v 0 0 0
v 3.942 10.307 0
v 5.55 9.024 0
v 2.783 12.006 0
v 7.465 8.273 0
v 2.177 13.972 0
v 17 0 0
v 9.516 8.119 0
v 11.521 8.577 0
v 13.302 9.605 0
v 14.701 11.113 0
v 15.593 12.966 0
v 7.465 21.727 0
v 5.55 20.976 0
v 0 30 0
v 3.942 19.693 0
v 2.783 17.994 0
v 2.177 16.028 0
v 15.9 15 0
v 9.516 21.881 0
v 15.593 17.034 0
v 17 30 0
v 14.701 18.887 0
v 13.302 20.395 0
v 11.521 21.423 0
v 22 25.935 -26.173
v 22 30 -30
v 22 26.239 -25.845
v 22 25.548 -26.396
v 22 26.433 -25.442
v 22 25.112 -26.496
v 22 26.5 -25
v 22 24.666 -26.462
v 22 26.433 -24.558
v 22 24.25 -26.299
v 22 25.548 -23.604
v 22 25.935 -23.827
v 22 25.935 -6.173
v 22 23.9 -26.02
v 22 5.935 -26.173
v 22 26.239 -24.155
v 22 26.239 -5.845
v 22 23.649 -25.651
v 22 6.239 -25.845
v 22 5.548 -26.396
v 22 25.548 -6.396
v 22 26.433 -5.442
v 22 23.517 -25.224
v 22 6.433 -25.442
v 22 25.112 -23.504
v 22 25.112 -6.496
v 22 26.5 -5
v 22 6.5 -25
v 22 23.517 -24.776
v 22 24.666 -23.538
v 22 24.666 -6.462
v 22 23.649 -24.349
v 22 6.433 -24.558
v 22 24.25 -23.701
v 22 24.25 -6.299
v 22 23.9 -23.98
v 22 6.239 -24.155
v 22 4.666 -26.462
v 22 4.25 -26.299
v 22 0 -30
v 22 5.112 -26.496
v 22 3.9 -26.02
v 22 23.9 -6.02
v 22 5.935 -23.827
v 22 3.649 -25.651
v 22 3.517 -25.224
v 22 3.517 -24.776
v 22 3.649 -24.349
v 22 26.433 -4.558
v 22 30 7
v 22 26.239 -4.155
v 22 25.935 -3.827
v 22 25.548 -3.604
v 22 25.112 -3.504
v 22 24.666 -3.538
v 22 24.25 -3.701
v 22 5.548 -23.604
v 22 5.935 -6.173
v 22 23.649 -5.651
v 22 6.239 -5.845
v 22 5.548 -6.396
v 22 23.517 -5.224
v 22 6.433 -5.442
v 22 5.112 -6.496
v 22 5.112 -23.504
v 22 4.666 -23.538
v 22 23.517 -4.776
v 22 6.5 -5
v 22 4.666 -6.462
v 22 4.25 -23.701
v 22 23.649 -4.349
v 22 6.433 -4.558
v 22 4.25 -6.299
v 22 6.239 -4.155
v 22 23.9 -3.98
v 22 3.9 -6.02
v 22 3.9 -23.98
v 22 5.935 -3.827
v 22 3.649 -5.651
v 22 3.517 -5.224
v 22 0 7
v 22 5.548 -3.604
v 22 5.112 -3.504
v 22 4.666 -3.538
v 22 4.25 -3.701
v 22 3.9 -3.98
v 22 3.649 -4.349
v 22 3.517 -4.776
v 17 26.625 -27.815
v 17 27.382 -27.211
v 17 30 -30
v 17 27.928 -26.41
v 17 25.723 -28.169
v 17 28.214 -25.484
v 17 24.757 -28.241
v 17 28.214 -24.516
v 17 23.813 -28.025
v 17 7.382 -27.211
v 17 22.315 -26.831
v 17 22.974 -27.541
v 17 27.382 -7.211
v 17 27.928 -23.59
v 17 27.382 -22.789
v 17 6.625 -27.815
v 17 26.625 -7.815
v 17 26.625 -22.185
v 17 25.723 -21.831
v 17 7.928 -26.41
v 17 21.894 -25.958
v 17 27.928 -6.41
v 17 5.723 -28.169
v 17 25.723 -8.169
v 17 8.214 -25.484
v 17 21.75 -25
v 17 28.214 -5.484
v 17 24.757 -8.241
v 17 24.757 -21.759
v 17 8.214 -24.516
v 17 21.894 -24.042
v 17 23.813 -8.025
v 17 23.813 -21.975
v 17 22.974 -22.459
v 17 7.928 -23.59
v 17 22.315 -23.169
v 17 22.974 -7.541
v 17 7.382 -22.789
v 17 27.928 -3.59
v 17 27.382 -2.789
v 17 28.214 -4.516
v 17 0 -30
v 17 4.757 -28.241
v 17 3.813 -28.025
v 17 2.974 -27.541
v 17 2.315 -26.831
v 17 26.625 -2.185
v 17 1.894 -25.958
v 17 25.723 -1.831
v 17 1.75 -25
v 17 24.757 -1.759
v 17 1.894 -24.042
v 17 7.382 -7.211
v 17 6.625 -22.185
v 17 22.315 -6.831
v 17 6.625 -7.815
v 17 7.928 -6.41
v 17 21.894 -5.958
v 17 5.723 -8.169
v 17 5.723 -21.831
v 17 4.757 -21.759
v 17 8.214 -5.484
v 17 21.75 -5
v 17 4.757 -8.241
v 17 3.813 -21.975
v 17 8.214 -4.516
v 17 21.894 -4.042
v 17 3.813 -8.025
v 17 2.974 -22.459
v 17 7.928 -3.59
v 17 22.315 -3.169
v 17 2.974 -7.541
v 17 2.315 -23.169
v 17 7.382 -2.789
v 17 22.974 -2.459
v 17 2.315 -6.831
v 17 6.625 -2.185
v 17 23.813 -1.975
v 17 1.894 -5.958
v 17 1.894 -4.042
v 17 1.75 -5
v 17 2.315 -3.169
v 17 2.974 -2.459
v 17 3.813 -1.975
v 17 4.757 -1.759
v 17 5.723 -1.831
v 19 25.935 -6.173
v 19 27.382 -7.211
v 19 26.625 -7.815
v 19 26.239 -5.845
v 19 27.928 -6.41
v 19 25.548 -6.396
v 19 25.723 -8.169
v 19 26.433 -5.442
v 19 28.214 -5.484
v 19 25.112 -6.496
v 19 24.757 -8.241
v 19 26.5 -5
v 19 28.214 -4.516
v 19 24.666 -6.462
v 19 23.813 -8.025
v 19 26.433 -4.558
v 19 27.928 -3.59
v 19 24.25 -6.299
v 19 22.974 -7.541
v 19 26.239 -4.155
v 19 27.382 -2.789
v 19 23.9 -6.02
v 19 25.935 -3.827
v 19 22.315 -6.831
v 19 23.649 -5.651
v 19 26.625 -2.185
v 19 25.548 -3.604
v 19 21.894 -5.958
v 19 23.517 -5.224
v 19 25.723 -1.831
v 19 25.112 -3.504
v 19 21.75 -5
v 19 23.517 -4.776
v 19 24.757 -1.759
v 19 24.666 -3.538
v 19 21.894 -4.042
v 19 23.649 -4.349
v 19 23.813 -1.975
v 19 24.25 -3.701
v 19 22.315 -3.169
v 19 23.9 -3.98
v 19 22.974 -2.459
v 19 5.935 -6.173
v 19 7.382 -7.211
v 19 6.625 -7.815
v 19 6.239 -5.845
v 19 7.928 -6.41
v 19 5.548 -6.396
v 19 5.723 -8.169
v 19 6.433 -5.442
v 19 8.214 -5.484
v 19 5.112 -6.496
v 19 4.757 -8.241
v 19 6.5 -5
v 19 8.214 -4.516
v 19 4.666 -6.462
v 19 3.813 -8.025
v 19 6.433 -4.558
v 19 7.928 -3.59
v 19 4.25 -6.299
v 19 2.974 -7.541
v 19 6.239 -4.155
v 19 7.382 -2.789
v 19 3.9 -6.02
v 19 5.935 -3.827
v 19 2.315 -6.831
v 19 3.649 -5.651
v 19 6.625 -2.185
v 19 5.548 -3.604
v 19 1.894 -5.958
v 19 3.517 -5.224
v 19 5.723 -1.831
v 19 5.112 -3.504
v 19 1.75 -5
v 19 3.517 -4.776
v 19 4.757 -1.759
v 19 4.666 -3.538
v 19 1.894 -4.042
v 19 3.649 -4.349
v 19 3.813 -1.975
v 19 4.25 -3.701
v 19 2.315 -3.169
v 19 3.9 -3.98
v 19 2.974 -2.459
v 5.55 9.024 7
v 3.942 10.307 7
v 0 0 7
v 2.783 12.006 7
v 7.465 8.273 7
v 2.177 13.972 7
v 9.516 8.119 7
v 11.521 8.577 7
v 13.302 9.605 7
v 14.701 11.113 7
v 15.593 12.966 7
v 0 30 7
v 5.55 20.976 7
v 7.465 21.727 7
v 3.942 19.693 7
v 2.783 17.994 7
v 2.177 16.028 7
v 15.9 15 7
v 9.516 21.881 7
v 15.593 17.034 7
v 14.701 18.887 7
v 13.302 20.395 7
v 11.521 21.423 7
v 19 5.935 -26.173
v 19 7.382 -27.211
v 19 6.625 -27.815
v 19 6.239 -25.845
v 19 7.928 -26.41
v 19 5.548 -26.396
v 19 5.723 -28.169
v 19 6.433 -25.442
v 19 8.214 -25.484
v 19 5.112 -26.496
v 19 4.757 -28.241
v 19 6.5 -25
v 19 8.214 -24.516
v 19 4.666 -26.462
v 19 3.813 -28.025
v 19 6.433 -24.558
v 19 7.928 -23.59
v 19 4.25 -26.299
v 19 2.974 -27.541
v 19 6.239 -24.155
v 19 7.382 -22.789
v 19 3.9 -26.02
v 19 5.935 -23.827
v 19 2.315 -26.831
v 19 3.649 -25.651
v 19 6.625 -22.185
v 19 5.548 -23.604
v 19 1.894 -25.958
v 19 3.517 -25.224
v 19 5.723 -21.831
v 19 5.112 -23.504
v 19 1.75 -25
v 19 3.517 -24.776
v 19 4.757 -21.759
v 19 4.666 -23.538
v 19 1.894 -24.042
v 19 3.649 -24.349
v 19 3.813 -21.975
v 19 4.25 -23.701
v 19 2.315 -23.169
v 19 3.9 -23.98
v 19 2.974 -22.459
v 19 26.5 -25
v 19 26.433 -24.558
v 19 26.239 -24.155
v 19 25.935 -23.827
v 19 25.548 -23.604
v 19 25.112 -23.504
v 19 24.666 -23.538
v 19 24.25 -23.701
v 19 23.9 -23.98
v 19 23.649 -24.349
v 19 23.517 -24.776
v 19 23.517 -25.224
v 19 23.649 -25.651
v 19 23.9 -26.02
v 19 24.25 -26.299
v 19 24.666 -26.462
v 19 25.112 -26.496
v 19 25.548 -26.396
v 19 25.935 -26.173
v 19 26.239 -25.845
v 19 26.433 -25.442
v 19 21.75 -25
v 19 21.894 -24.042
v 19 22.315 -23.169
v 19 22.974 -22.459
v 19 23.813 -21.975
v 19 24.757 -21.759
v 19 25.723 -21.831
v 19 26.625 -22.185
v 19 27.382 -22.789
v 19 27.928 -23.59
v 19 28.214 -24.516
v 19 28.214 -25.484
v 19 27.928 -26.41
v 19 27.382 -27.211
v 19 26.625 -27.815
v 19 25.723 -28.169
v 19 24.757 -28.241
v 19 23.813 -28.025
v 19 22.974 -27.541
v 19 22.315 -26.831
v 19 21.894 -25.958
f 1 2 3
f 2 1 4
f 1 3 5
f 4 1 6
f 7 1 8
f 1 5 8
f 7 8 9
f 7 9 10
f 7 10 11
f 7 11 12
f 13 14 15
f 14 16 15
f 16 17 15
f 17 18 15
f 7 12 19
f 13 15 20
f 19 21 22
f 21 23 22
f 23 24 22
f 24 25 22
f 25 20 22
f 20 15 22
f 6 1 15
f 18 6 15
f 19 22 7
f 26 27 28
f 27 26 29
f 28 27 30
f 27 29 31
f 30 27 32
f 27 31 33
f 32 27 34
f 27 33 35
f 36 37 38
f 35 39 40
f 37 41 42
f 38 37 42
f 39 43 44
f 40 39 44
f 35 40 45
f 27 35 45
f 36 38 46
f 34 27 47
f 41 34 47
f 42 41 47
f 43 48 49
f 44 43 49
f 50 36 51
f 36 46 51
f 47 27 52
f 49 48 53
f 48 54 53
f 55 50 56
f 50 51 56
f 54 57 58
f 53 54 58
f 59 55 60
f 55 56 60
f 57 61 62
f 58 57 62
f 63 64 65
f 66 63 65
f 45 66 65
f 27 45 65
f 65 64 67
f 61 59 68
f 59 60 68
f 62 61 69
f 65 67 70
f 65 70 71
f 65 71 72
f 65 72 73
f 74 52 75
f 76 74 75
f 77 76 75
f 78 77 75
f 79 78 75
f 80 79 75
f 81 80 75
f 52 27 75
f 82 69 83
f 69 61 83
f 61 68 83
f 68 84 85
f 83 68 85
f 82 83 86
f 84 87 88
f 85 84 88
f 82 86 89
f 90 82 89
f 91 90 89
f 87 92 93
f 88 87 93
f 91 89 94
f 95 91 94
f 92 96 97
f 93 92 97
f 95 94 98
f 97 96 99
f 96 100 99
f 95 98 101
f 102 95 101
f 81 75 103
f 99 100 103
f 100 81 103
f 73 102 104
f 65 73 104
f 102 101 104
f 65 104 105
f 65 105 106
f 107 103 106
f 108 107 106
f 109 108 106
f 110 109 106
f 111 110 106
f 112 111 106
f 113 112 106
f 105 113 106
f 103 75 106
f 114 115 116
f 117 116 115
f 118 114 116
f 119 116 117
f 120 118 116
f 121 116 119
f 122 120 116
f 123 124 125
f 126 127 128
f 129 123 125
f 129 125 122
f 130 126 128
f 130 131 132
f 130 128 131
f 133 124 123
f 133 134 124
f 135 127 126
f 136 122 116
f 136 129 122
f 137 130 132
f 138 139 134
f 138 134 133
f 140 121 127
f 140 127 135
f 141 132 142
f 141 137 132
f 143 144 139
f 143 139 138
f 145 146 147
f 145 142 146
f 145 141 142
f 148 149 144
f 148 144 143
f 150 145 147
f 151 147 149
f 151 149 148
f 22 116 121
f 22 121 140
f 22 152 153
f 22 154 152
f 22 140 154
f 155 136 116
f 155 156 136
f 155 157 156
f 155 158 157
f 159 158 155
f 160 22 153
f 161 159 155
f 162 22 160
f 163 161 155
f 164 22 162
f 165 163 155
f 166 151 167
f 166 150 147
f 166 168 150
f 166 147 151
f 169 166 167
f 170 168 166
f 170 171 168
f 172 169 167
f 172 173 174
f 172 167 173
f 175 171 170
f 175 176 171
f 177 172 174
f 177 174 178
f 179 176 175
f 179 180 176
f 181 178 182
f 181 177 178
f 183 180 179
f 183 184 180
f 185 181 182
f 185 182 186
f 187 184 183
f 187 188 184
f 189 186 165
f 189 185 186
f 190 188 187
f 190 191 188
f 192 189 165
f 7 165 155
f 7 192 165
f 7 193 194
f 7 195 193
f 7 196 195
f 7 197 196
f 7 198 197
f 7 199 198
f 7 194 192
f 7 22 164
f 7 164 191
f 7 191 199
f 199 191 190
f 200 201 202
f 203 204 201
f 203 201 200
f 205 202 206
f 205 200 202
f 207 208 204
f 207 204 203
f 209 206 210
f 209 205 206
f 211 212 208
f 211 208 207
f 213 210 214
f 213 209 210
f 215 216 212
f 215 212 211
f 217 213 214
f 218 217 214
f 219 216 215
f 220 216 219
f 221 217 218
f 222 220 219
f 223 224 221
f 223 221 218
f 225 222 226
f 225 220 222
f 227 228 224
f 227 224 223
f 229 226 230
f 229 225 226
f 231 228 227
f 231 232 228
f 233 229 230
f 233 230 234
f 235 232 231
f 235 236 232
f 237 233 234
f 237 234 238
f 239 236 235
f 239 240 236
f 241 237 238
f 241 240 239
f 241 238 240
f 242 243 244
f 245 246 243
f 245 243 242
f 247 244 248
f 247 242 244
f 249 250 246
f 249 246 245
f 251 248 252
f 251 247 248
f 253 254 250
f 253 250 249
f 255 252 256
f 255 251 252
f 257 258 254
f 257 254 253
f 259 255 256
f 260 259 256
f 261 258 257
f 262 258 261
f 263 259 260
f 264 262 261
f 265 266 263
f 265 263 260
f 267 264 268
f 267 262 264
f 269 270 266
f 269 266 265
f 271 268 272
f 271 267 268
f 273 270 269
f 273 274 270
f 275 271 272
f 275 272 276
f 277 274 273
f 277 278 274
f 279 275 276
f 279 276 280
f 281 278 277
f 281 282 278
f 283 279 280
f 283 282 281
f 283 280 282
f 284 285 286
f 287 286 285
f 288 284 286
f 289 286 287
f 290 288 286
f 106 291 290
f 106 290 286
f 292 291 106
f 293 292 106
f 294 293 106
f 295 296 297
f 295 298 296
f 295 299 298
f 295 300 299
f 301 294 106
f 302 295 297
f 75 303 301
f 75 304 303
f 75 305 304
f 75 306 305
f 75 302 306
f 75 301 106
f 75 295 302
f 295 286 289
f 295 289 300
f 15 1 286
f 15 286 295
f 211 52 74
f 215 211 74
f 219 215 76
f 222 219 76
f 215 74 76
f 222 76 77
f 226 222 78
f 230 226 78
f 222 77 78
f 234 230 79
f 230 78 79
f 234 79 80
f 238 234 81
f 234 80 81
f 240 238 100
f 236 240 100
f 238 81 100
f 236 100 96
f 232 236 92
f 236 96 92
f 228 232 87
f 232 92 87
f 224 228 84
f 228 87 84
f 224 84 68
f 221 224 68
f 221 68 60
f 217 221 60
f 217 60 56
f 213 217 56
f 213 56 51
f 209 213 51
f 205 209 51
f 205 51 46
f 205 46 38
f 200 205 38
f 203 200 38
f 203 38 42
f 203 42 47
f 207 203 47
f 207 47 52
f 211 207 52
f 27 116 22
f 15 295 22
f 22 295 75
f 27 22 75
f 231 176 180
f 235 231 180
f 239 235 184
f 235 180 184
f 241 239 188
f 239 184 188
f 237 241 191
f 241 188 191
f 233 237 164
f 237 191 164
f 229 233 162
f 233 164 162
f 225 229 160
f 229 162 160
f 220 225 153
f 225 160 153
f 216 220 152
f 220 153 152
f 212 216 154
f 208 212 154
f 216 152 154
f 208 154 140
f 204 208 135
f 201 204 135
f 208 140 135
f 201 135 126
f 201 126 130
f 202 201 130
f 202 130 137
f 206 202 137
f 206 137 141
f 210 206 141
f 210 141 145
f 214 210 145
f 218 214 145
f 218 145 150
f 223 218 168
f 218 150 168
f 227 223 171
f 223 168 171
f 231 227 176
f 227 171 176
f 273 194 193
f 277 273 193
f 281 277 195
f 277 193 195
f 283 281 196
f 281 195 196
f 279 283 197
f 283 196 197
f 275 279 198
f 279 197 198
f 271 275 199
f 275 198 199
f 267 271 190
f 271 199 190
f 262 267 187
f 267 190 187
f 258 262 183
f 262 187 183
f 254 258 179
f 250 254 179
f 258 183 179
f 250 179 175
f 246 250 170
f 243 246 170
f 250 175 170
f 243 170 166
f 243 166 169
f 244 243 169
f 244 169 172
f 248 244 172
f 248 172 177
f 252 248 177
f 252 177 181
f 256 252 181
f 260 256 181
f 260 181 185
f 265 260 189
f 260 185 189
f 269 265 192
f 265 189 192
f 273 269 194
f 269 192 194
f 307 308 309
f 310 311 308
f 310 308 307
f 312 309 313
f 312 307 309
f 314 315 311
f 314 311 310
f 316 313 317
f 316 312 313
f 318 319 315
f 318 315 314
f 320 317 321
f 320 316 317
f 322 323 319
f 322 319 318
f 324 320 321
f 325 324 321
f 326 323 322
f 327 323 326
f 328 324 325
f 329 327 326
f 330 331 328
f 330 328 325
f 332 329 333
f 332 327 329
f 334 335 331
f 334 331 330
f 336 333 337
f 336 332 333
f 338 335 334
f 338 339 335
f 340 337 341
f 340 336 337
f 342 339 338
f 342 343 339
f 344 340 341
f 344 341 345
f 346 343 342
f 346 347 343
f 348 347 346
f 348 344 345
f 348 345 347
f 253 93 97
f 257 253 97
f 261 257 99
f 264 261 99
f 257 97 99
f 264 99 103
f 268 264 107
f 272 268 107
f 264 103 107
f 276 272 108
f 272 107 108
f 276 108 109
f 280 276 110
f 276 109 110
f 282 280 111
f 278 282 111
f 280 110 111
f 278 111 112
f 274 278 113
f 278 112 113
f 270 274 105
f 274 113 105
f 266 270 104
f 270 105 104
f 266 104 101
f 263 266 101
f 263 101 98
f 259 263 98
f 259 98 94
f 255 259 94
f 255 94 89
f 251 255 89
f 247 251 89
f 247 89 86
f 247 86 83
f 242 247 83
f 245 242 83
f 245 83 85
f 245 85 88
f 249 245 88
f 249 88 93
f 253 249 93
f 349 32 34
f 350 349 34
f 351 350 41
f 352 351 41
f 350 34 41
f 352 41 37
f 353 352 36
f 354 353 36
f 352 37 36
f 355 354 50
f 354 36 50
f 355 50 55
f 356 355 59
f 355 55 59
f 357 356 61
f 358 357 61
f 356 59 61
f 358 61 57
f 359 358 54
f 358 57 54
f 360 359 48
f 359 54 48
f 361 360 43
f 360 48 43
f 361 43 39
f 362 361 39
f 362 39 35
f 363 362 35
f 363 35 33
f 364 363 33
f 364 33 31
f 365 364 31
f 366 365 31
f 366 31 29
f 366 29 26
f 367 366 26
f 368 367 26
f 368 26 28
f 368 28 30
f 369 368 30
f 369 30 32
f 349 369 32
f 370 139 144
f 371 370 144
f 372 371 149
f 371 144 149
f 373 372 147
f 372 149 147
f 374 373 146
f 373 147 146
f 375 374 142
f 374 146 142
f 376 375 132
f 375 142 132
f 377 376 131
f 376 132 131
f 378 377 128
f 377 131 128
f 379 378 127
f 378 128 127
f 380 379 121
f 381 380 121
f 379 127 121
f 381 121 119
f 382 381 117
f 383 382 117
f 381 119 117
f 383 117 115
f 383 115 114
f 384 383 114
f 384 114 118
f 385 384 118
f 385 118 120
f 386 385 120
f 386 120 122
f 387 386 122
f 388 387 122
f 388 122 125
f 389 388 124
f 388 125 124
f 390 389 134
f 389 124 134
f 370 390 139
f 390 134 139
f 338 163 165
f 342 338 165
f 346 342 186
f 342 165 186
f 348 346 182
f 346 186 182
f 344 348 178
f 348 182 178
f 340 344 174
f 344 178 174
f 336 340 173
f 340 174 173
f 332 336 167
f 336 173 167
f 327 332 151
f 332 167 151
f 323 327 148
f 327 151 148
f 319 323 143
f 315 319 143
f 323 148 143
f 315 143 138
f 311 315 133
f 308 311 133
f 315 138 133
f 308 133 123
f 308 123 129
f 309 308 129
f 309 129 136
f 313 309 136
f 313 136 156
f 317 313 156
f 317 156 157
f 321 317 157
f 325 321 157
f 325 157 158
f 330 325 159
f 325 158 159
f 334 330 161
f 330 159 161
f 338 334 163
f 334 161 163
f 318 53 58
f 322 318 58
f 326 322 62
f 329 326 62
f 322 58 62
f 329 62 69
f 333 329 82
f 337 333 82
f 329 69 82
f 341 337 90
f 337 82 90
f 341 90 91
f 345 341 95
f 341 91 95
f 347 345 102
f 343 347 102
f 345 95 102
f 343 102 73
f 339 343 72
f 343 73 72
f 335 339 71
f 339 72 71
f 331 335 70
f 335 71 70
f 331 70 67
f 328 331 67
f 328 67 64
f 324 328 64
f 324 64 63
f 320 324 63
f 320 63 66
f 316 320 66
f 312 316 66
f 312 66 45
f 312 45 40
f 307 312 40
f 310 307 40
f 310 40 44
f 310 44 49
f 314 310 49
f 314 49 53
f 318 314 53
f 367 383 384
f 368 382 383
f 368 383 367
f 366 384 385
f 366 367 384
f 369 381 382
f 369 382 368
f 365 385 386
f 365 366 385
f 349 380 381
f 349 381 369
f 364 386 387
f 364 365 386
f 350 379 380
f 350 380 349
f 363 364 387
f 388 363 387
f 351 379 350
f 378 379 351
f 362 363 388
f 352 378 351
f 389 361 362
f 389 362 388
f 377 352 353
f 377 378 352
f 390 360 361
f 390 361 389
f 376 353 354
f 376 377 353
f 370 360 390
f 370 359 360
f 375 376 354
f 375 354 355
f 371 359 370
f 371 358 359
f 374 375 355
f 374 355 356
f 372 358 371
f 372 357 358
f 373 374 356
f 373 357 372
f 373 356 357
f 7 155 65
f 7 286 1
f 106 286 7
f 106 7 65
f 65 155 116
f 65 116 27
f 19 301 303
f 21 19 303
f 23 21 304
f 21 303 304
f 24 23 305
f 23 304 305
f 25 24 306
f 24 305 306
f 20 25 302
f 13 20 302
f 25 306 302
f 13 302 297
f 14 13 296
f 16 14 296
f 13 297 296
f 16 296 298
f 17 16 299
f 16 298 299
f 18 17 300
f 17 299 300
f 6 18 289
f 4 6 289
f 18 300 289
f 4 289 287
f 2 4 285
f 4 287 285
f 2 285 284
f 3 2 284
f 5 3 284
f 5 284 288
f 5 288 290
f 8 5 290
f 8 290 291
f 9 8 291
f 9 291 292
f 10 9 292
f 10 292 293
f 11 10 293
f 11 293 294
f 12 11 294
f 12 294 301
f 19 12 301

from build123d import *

# Parameters (mm, degrees)
F0_W     = 22
F0_H     = 30
F1_DEPTH = 7
F2_R     = 6.9
F3_DEPTH = 25
F4_W     = 5
F4_H     = 30
F5_DEPTH = 30
F6_R     = 1.5
F7_DEPTH = 25
F8_R     = 3.25
F9_DEPTH = 2


with BuildPart() as f1:
    # F0 (on Top) → F1 (new body)
    with BuildSketch(Plane.XY):
        with Locations((11, 15)):
            Rectangle(F0_W, F0_H)
    extrude(amount=F1_DEPTH)

    # F2 (on face) → F3 (cut)
    with BuildSketch(Plane.XY.offset(7)):
        with Locations((9, 15)):
            Circle(F2_R)
    extrude(amount=-F3_DEPTH, mode=Mode.SUBTRACT)

    # F4 (on face) → F5 (join)
    with BuildSketch(Plane(origin=(0, 0, 0), x_dir=(1, 0, 0), z_dir=(0, 0, -1))):
        with Locations((19.5, -15)):
            Rectangle(F4_W, F4_H)
    extrude(amount=F5_DEPTH)

    # F6 (on face) → F7 (cut)
    with BuildSketch(Plane.YZ.offset(22)):
        with Locations((5, -25)):
            Circle(F6_R)
        with Locations((25, -25)):
            Circle(F6_R)
        with Locations((25, -5)):
            Circle(F6_R)
        with Locations((5, -5)):
            Circle(F6_R)
    extrude(amount=-F7_DEPTH, mode=Mode.SUBTRACT)

    # F8 (on face) → F9 (cut)
    with BuildSketch(Plane(origin=(17, 0, 0), x_dir=(0, -1, 0), z_dir=(-1, 0, 0))):
        with Locations((-25, -5)):
            Circle(F8_R)
        with Locations((-5, -5)):
            Circle(F8_R)
        with Locations((-5, -25)):
            Circle(F8_R)
        with Locations((-25, -25)):
            Circle(F8_R)
    extrude(amount=-F9_DEPTH, mode=Mode.SUBTRACT)


solid = f1.part
